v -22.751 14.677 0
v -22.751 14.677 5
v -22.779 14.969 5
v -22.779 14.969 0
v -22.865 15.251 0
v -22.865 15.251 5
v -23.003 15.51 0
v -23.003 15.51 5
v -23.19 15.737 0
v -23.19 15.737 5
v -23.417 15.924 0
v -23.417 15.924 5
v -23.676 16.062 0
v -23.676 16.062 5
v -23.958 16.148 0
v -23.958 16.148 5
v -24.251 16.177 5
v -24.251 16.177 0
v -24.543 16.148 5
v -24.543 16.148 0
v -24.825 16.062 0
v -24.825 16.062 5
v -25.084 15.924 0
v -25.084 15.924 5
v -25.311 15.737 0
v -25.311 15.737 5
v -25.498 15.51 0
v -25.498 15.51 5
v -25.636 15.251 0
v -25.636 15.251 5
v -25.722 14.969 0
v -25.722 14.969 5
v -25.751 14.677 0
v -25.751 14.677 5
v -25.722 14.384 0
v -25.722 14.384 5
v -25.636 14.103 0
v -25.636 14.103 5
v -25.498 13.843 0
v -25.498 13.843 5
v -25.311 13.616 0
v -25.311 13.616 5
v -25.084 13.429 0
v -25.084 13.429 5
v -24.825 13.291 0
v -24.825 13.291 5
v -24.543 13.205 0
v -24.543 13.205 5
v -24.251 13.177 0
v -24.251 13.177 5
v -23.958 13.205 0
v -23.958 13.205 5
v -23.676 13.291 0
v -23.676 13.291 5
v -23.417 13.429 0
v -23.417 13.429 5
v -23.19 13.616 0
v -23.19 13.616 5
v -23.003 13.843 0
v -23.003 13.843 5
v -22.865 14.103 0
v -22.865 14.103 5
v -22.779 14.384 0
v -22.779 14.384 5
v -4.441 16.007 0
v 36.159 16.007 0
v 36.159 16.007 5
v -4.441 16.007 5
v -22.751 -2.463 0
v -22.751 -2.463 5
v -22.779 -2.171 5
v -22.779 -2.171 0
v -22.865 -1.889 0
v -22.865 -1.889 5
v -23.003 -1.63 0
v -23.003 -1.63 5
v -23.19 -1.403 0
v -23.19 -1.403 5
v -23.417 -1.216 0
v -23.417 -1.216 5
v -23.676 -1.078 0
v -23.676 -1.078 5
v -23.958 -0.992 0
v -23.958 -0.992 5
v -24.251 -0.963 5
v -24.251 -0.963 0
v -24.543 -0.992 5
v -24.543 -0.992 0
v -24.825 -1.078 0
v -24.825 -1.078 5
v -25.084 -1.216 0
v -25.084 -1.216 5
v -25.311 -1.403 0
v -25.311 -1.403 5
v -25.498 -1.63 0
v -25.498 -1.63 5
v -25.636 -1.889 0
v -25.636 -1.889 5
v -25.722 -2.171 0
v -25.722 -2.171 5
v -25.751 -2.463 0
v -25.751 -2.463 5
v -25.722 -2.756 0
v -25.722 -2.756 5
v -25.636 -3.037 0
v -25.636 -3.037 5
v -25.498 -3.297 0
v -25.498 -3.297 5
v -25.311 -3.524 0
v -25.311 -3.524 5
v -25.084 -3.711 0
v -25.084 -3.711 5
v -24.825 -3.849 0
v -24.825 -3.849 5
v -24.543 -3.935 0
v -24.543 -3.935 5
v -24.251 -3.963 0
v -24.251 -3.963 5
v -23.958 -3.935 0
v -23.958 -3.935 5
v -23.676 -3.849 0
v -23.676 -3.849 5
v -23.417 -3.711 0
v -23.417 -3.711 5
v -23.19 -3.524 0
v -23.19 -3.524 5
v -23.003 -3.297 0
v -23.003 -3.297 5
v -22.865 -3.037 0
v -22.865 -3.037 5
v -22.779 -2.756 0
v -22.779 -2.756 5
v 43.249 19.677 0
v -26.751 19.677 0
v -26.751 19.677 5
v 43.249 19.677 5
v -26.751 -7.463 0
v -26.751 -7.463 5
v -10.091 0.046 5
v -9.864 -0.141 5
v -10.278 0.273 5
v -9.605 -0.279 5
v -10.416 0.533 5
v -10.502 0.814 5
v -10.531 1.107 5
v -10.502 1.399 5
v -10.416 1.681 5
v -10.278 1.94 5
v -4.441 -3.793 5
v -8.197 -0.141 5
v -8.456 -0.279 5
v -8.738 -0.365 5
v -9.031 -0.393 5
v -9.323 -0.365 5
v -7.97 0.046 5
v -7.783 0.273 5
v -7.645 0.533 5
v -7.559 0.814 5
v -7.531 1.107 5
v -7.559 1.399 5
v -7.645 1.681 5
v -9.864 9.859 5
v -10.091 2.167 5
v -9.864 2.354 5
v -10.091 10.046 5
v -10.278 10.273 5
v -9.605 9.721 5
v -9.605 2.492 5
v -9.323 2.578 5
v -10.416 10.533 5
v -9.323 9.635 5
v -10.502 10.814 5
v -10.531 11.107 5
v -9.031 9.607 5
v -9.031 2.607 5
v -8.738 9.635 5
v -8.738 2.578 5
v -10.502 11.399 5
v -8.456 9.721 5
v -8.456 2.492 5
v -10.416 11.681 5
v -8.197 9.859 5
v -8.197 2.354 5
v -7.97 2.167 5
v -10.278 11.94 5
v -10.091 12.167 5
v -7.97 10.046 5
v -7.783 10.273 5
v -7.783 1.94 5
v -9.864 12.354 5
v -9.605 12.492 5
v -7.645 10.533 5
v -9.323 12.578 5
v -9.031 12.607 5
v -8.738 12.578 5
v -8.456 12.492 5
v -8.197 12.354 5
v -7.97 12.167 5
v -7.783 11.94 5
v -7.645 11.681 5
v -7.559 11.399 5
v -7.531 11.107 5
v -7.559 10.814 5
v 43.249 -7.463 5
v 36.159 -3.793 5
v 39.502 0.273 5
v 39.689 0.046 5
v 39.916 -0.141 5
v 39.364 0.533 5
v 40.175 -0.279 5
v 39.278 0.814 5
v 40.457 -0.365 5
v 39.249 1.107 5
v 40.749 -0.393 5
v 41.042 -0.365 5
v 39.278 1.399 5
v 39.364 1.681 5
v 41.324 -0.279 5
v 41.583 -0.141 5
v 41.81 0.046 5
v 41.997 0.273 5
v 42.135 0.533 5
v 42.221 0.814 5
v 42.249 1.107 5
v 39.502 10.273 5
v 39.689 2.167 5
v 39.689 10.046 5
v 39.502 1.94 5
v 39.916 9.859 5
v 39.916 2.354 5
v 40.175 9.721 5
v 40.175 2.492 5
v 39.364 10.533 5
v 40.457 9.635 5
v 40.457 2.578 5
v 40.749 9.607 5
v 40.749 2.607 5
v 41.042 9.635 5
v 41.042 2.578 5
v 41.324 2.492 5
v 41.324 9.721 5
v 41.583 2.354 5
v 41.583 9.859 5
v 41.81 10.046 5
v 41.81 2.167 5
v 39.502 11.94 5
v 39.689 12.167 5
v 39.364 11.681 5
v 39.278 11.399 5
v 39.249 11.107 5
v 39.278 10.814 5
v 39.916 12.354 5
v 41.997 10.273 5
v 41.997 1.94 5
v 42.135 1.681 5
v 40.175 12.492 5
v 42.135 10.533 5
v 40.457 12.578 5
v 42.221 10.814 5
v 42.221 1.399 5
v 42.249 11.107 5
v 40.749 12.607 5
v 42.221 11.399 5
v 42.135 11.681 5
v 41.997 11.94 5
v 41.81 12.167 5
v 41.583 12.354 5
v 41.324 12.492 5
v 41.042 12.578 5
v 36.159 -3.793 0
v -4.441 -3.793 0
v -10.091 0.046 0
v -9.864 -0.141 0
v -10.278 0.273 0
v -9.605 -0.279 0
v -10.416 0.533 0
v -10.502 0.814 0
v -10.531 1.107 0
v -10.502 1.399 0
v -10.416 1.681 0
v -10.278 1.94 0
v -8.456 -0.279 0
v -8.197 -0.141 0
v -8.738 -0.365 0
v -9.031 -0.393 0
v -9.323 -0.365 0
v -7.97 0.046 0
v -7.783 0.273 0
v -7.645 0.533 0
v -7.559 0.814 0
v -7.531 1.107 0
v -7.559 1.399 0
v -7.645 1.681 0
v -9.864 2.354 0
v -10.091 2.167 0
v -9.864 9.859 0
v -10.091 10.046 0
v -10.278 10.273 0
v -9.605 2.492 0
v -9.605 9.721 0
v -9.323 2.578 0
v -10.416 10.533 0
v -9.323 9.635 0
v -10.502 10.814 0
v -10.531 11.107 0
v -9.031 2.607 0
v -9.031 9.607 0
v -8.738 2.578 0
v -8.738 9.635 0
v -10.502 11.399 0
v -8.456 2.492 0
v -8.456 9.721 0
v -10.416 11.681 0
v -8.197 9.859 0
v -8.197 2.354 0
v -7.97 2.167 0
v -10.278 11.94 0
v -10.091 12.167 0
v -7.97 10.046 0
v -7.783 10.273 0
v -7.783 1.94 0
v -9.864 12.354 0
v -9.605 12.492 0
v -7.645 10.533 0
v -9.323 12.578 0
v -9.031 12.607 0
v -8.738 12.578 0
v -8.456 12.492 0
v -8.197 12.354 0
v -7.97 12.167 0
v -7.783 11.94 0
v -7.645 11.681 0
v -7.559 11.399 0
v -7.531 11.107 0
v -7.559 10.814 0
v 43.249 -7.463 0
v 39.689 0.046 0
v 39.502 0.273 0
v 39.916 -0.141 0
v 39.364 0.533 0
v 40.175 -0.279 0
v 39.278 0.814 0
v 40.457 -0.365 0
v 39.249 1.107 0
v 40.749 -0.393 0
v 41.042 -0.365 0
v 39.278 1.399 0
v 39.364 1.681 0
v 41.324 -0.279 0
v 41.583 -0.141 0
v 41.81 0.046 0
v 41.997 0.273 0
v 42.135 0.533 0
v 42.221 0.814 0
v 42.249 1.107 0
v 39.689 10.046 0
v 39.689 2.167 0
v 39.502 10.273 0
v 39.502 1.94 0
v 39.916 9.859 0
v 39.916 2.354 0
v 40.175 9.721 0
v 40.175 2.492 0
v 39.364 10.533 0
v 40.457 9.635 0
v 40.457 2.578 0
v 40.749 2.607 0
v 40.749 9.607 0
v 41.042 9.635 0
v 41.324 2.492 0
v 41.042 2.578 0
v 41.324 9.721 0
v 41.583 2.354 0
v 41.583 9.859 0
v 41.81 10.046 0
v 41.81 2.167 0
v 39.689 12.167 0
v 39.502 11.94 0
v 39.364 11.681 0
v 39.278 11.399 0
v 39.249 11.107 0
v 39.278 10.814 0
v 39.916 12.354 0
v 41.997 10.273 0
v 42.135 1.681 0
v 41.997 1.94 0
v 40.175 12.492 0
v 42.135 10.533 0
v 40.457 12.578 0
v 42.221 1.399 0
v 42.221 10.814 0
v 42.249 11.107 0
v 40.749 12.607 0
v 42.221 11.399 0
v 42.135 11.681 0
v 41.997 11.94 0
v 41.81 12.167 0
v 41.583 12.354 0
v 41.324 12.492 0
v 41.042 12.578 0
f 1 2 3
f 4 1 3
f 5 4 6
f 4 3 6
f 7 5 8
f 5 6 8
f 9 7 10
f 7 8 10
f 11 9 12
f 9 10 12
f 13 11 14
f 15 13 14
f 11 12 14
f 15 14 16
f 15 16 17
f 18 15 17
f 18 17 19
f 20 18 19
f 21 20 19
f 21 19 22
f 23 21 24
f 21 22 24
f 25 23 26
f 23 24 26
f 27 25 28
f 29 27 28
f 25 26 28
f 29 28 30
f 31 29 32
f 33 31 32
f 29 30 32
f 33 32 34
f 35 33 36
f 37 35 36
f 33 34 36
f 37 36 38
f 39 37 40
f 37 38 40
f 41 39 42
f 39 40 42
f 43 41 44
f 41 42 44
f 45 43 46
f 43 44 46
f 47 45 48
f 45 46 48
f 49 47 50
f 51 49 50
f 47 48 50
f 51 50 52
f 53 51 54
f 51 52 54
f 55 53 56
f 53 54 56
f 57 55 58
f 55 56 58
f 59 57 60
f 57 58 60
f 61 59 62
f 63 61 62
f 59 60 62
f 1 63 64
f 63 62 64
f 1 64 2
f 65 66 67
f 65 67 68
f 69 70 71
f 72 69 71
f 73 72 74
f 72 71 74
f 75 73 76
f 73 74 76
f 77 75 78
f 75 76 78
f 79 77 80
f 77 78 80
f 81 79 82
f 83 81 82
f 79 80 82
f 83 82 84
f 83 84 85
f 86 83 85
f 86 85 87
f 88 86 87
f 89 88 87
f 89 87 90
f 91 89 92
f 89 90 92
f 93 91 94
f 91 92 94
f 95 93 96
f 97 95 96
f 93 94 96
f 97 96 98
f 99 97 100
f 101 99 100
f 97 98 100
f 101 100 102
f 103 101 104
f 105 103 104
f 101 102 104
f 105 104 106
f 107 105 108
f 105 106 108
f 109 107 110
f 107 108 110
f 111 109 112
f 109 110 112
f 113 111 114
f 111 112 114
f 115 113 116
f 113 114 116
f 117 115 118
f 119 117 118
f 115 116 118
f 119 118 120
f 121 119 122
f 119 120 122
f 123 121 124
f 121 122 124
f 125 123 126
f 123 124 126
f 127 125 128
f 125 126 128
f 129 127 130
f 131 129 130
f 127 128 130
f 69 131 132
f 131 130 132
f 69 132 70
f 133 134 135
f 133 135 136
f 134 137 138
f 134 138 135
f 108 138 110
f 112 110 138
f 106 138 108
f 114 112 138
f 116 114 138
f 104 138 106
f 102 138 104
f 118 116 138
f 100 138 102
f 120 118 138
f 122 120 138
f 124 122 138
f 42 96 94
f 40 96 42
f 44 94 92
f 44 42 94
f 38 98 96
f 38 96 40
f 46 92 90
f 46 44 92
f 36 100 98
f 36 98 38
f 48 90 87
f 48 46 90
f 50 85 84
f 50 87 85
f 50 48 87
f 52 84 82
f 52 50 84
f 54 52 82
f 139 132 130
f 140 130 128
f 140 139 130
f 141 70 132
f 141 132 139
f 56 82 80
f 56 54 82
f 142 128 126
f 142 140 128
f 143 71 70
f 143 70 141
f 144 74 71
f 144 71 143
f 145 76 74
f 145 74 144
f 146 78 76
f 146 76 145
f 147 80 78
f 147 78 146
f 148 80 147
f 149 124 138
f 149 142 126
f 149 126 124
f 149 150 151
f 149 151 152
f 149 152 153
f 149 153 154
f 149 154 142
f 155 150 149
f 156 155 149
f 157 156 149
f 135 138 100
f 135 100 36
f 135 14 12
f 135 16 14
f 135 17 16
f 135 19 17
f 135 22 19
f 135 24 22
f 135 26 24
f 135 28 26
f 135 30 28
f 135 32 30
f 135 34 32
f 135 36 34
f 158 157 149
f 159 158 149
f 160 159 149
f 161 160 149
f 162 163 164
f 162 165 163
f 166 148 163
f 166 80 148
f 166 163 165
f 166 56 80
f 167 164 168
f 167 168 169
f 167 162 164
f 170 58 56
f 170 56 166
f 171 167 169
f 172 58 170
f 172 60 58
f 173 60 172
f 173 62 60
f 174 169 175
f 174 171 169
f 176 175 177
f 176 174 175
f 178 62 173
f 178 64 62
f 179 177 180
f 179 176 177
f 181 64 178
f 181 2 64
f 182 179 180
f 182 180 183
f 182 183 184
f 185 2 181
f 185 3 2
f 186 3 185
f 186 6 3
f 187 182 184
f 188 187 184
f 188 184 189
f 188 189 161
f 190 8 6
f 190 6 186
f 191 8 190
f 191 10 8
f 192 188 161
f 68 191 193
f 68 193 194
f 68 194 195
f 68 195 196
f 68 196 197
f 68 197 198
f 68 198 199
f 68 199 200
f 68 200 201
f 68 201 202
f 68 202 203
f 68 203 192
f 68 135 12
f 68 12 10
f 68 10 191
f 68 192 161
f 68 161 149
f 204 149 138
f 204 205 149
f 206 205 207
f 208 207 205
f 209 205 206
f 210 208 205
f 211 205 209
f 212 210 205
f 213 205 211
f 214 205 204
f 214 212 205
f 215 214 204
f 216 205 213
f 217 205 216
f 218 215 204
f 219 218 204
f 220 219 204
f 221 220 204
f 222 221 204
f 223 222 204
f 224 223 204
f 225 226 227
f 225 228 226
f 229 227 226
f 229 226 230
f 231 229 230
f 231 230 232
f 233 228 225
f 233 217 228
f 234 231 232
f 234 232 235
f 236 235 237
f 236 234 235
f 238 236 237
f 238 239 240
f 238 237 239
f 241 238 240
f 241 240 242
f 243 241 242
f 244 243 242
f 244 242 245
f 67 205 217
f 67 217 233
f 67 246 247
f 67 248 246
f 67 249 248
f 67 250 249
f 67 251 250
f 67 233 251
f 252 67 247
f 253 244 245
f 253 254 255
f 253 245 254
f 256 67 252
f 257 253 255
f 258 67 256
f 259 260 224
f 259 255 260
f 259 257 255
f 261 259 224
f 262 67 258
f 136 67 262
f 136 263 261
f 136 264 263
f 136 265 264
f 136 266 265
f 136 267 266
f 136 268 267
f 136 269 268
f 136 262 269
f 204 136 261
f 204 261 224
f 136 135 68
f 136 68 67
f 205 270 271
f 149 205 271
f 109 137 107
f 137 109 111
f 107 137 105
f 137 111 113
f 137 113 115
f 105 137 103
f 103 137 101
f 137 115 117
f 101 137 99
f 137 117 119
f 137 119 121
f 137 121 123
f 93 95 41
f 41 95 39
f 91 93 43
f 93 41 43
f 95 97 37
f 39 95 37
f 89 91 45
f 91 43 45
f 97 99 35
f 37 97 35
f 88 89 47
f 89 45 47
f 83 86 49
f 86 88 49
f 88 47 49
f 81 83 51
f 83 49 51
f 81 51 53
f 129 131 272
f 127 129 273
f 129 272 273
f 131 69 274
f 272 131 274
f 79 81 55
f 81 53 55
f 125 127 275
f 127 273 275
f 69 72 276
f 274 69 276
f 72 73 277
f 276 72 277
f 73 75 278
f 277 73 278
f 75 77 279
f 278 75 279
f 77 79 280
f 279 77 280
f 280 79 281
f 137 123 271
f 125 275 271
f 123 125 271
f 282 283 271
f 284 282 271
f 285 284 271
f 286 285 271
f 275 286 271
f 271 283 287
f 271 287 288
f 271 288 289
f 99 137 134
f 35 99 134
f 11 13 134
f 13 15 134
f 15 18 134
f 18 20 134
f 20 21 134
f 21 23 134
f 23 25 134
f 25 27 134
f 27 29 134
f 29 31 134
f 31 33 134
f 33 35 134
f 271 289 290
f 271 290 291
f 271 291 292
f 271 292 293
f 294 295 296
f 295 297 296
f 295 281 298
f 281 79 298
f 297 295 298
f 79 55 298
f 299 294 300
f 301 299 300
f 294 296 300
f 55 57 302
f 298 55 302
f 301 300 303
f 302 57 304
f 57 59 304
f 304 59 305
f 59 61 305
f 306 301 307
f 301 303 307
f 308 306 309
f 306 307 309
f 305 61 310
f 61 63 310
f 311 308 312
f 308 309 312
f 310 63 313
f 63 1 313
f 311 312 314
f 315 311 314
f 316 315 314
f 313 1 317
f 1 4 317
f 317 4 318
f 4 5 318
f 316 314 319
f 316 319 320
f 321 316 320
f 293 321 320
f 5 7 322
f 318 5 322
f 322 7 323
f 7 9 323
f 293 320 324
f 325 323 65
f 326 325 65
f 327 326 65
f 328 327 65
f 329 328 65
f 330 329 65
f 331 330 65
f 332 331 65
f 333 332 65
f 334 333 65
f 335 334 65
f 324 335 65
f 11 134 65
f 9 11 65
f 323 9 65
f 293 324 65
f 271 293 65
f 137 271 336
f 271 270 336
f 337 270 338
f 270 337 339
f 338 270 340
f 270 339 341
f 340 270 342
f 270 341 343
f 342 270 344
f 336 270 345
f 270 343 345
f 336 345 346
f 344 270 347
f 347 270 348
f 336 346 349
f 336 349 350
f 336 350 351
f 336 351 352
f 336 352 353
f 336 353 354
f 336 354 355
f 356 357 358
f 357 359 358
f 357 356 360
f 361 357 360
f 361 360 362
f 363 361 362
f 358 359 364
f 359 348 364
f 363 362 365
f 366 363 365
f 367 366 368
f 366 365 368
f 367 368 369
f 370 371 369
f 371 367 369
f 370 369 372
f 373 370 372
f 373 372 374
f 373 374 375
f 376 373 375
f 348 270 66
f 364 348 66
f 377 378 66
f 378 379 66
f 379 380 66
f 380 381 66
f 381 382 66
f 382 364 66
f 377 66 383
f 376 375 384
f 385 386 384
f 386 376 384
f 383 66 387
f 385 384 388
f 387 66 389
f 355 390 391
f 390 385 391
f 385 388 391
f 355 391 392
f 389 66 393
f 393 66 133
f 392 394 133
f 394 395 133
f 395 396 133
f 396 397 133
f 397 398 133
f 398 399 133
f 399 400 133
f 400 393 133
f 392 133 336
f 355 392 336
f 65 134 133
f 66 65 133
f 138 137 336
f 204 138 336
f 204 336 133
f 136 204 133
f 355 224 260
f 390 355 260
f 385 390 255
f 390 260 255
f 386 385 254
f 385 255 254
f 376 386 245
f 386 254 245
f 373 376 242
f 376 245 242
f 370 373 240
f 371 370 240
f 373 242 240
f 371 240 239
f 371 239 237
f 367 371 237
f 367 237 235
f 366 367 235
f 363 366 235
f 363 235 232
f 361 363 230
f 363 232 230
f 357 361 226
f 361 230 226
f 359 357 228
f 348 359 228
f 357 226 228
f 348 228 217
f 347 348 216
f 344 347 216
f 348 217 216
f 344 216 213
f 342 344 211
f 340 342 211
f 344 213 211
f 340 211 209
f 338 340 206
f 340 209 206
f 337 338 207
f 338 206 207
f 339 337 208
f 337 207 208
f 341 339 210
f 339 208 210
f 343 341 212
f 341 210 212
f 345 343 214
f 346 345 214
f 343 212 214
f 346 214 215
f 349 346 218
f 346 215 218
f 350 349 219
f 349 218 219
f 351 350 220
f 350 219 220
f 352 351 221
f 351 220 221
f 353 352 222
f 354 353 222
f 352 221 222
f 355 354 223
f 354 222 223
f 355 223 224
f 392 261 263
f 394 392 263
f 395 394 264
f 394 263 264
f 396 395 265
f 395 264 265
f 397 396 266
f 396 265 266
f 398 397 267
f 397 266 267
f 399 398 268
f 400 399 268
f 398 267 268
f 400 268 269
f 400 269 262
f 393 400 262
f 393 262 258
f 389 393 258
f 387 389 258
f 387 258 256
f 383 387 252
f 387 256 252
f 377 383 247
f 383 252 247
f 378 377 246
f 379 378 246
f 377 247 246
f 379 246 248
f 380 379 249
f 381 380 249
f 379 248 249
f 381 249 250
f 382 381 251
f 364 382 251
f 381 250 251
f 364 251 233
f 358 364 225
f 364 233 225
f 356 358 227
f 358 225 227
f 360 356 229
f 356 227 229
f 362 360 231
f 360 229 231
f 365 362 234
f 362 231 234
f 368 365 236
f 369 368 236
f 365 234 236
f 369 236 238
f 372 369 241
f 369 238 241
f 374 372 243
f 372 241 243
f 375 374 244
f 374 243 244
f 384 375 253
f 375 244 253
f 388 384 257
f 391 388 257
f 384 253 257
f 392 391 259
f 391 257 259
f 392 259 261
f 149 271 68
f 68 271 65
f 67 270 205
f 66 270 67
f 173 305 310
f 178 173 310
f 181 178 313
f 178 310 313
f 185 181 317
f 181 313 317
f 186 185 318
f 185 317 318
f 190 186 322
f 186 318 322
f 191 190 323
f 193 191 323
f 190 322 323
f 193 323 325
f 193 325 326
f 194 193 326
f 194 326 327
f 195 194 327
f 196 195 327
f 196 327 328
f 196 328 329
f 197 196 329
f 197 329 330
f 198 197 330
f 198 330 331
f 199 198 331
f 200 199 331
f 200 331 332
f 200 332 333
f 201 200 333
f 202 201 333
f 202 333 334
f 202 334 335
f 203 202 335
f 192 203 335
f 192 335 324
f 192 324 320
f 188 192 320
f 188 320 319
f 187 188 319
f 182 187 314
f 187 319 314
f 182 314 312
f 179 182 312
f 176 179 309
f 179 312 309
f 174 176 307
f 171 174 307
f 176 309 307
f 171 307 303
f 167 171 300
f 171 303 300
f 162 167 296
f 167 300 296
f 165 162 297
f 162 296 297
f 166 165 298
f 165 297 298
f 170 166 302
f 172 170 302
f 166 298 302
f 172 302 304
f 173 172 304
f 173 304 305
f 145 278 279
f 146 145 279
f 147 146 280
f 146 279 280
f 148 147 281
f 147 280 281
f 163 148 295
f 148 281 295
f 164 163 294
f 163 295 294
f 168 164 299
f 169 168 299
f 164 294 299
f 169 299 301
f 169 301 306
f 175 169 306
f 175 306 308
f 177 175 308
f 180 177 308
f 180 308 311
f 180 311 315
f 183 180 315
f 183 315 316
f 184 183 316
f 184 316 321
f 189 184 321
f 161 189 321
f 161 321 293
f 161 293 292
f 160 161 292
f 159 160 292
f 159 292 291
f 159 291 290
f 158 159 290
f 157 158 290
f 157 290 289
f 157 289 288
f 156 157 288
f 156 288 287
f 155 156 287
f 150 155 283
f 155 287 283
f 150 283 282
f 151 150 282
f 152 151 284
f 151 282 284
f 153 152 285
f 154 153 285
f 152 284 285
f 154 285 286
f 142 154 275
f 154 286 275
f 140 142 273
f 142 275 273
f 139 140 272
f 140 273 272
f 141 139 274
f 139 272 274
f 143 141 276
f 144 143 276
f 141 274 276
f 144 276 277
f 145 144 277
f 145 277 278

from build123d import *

# Parameters (mm, degrees)
ESBO_O1_W                = 70
ESBO_O1_H                = 27.14
RESSALTO_EXTRUS_O1_DEPTH = 5
ESBO_O2_R                = 1.5
CORTE_EXTRUS_O1_DEPTH    = 5
ESBO_O4_W                = 40.6
ESBO_O4_H                = 19.8
CORTE_EXTRUS_O2_DEPTH    = 6
ESBO_O5_R                = 1.5
CORTE_EXTRUS_O3_DEPTH    = 6


with BuildPart() as part:
    # Esboço1 → Ressalto-extrusão1 (new body)
    with BuildSketch(Plane.XY):
        with Locations((8.249487122, 6.106616915)):
            Rectangle(ESBO_O1_W, ESBO_O1_H)
    extrude(amount=RESSALTO_EXTRUS_O1_DEPTH)

    # Esboço2 → Corte-extrusão1 (cut)
    with BuildSketch(Plane.XY.offset(5)):
        with Locations((-24.250512878, 14.676616915)):
            Circle(ESBO_O2_R)
        with Locations((-24.250512878, -2.463383085)):
            Circle(ESBO_O2_R)
        with Locations((40.749487122, 11.106616915)):
            Circle(ESBO_O2_R)
        with Locations((40.749487122, 1.106616915)):
            Circle(ESBO_O2_R)
    extrude(amount=-CORTE_EXTRUS_O1_DEPTH, mode=Mode.SUBTRACT)

    # Esboço4 → Corte-extrusão2 (cut, through all)
    with BuildSketch(Plane(origin=(0, 0, 0), x_dir=(-1, 0, 0), z_dir=(0, 0, -1))):
        with Locations((-15.859487122, 6.106616915)):
            Rectangle(ESBO_O4_W, ESBO_O4_H)
    extrude(amount=-CORTE_EXTRUS_O2_DEPTH, mode=Mode.SUBTRACT)

    # Esboço5 → Corte-extrusão3 (cut, through all)
    with BuildSketch(Plane(origin=(0, 0, 0), x_dir=(-1, 0, 0), z_dir=(0, 0, -1))):
        with Locations((9.030512878, 1.106616915)):
            Circle(ESBO_O5_R)
        with Locations((9.030512878, 11.106616915)):
            Circle(ESBO_O5_R)
    extrude(amount=-CORTE_EXTRUS_O3_DEPTH, mode=Mode.SUBTRACT)


solid = part.part
